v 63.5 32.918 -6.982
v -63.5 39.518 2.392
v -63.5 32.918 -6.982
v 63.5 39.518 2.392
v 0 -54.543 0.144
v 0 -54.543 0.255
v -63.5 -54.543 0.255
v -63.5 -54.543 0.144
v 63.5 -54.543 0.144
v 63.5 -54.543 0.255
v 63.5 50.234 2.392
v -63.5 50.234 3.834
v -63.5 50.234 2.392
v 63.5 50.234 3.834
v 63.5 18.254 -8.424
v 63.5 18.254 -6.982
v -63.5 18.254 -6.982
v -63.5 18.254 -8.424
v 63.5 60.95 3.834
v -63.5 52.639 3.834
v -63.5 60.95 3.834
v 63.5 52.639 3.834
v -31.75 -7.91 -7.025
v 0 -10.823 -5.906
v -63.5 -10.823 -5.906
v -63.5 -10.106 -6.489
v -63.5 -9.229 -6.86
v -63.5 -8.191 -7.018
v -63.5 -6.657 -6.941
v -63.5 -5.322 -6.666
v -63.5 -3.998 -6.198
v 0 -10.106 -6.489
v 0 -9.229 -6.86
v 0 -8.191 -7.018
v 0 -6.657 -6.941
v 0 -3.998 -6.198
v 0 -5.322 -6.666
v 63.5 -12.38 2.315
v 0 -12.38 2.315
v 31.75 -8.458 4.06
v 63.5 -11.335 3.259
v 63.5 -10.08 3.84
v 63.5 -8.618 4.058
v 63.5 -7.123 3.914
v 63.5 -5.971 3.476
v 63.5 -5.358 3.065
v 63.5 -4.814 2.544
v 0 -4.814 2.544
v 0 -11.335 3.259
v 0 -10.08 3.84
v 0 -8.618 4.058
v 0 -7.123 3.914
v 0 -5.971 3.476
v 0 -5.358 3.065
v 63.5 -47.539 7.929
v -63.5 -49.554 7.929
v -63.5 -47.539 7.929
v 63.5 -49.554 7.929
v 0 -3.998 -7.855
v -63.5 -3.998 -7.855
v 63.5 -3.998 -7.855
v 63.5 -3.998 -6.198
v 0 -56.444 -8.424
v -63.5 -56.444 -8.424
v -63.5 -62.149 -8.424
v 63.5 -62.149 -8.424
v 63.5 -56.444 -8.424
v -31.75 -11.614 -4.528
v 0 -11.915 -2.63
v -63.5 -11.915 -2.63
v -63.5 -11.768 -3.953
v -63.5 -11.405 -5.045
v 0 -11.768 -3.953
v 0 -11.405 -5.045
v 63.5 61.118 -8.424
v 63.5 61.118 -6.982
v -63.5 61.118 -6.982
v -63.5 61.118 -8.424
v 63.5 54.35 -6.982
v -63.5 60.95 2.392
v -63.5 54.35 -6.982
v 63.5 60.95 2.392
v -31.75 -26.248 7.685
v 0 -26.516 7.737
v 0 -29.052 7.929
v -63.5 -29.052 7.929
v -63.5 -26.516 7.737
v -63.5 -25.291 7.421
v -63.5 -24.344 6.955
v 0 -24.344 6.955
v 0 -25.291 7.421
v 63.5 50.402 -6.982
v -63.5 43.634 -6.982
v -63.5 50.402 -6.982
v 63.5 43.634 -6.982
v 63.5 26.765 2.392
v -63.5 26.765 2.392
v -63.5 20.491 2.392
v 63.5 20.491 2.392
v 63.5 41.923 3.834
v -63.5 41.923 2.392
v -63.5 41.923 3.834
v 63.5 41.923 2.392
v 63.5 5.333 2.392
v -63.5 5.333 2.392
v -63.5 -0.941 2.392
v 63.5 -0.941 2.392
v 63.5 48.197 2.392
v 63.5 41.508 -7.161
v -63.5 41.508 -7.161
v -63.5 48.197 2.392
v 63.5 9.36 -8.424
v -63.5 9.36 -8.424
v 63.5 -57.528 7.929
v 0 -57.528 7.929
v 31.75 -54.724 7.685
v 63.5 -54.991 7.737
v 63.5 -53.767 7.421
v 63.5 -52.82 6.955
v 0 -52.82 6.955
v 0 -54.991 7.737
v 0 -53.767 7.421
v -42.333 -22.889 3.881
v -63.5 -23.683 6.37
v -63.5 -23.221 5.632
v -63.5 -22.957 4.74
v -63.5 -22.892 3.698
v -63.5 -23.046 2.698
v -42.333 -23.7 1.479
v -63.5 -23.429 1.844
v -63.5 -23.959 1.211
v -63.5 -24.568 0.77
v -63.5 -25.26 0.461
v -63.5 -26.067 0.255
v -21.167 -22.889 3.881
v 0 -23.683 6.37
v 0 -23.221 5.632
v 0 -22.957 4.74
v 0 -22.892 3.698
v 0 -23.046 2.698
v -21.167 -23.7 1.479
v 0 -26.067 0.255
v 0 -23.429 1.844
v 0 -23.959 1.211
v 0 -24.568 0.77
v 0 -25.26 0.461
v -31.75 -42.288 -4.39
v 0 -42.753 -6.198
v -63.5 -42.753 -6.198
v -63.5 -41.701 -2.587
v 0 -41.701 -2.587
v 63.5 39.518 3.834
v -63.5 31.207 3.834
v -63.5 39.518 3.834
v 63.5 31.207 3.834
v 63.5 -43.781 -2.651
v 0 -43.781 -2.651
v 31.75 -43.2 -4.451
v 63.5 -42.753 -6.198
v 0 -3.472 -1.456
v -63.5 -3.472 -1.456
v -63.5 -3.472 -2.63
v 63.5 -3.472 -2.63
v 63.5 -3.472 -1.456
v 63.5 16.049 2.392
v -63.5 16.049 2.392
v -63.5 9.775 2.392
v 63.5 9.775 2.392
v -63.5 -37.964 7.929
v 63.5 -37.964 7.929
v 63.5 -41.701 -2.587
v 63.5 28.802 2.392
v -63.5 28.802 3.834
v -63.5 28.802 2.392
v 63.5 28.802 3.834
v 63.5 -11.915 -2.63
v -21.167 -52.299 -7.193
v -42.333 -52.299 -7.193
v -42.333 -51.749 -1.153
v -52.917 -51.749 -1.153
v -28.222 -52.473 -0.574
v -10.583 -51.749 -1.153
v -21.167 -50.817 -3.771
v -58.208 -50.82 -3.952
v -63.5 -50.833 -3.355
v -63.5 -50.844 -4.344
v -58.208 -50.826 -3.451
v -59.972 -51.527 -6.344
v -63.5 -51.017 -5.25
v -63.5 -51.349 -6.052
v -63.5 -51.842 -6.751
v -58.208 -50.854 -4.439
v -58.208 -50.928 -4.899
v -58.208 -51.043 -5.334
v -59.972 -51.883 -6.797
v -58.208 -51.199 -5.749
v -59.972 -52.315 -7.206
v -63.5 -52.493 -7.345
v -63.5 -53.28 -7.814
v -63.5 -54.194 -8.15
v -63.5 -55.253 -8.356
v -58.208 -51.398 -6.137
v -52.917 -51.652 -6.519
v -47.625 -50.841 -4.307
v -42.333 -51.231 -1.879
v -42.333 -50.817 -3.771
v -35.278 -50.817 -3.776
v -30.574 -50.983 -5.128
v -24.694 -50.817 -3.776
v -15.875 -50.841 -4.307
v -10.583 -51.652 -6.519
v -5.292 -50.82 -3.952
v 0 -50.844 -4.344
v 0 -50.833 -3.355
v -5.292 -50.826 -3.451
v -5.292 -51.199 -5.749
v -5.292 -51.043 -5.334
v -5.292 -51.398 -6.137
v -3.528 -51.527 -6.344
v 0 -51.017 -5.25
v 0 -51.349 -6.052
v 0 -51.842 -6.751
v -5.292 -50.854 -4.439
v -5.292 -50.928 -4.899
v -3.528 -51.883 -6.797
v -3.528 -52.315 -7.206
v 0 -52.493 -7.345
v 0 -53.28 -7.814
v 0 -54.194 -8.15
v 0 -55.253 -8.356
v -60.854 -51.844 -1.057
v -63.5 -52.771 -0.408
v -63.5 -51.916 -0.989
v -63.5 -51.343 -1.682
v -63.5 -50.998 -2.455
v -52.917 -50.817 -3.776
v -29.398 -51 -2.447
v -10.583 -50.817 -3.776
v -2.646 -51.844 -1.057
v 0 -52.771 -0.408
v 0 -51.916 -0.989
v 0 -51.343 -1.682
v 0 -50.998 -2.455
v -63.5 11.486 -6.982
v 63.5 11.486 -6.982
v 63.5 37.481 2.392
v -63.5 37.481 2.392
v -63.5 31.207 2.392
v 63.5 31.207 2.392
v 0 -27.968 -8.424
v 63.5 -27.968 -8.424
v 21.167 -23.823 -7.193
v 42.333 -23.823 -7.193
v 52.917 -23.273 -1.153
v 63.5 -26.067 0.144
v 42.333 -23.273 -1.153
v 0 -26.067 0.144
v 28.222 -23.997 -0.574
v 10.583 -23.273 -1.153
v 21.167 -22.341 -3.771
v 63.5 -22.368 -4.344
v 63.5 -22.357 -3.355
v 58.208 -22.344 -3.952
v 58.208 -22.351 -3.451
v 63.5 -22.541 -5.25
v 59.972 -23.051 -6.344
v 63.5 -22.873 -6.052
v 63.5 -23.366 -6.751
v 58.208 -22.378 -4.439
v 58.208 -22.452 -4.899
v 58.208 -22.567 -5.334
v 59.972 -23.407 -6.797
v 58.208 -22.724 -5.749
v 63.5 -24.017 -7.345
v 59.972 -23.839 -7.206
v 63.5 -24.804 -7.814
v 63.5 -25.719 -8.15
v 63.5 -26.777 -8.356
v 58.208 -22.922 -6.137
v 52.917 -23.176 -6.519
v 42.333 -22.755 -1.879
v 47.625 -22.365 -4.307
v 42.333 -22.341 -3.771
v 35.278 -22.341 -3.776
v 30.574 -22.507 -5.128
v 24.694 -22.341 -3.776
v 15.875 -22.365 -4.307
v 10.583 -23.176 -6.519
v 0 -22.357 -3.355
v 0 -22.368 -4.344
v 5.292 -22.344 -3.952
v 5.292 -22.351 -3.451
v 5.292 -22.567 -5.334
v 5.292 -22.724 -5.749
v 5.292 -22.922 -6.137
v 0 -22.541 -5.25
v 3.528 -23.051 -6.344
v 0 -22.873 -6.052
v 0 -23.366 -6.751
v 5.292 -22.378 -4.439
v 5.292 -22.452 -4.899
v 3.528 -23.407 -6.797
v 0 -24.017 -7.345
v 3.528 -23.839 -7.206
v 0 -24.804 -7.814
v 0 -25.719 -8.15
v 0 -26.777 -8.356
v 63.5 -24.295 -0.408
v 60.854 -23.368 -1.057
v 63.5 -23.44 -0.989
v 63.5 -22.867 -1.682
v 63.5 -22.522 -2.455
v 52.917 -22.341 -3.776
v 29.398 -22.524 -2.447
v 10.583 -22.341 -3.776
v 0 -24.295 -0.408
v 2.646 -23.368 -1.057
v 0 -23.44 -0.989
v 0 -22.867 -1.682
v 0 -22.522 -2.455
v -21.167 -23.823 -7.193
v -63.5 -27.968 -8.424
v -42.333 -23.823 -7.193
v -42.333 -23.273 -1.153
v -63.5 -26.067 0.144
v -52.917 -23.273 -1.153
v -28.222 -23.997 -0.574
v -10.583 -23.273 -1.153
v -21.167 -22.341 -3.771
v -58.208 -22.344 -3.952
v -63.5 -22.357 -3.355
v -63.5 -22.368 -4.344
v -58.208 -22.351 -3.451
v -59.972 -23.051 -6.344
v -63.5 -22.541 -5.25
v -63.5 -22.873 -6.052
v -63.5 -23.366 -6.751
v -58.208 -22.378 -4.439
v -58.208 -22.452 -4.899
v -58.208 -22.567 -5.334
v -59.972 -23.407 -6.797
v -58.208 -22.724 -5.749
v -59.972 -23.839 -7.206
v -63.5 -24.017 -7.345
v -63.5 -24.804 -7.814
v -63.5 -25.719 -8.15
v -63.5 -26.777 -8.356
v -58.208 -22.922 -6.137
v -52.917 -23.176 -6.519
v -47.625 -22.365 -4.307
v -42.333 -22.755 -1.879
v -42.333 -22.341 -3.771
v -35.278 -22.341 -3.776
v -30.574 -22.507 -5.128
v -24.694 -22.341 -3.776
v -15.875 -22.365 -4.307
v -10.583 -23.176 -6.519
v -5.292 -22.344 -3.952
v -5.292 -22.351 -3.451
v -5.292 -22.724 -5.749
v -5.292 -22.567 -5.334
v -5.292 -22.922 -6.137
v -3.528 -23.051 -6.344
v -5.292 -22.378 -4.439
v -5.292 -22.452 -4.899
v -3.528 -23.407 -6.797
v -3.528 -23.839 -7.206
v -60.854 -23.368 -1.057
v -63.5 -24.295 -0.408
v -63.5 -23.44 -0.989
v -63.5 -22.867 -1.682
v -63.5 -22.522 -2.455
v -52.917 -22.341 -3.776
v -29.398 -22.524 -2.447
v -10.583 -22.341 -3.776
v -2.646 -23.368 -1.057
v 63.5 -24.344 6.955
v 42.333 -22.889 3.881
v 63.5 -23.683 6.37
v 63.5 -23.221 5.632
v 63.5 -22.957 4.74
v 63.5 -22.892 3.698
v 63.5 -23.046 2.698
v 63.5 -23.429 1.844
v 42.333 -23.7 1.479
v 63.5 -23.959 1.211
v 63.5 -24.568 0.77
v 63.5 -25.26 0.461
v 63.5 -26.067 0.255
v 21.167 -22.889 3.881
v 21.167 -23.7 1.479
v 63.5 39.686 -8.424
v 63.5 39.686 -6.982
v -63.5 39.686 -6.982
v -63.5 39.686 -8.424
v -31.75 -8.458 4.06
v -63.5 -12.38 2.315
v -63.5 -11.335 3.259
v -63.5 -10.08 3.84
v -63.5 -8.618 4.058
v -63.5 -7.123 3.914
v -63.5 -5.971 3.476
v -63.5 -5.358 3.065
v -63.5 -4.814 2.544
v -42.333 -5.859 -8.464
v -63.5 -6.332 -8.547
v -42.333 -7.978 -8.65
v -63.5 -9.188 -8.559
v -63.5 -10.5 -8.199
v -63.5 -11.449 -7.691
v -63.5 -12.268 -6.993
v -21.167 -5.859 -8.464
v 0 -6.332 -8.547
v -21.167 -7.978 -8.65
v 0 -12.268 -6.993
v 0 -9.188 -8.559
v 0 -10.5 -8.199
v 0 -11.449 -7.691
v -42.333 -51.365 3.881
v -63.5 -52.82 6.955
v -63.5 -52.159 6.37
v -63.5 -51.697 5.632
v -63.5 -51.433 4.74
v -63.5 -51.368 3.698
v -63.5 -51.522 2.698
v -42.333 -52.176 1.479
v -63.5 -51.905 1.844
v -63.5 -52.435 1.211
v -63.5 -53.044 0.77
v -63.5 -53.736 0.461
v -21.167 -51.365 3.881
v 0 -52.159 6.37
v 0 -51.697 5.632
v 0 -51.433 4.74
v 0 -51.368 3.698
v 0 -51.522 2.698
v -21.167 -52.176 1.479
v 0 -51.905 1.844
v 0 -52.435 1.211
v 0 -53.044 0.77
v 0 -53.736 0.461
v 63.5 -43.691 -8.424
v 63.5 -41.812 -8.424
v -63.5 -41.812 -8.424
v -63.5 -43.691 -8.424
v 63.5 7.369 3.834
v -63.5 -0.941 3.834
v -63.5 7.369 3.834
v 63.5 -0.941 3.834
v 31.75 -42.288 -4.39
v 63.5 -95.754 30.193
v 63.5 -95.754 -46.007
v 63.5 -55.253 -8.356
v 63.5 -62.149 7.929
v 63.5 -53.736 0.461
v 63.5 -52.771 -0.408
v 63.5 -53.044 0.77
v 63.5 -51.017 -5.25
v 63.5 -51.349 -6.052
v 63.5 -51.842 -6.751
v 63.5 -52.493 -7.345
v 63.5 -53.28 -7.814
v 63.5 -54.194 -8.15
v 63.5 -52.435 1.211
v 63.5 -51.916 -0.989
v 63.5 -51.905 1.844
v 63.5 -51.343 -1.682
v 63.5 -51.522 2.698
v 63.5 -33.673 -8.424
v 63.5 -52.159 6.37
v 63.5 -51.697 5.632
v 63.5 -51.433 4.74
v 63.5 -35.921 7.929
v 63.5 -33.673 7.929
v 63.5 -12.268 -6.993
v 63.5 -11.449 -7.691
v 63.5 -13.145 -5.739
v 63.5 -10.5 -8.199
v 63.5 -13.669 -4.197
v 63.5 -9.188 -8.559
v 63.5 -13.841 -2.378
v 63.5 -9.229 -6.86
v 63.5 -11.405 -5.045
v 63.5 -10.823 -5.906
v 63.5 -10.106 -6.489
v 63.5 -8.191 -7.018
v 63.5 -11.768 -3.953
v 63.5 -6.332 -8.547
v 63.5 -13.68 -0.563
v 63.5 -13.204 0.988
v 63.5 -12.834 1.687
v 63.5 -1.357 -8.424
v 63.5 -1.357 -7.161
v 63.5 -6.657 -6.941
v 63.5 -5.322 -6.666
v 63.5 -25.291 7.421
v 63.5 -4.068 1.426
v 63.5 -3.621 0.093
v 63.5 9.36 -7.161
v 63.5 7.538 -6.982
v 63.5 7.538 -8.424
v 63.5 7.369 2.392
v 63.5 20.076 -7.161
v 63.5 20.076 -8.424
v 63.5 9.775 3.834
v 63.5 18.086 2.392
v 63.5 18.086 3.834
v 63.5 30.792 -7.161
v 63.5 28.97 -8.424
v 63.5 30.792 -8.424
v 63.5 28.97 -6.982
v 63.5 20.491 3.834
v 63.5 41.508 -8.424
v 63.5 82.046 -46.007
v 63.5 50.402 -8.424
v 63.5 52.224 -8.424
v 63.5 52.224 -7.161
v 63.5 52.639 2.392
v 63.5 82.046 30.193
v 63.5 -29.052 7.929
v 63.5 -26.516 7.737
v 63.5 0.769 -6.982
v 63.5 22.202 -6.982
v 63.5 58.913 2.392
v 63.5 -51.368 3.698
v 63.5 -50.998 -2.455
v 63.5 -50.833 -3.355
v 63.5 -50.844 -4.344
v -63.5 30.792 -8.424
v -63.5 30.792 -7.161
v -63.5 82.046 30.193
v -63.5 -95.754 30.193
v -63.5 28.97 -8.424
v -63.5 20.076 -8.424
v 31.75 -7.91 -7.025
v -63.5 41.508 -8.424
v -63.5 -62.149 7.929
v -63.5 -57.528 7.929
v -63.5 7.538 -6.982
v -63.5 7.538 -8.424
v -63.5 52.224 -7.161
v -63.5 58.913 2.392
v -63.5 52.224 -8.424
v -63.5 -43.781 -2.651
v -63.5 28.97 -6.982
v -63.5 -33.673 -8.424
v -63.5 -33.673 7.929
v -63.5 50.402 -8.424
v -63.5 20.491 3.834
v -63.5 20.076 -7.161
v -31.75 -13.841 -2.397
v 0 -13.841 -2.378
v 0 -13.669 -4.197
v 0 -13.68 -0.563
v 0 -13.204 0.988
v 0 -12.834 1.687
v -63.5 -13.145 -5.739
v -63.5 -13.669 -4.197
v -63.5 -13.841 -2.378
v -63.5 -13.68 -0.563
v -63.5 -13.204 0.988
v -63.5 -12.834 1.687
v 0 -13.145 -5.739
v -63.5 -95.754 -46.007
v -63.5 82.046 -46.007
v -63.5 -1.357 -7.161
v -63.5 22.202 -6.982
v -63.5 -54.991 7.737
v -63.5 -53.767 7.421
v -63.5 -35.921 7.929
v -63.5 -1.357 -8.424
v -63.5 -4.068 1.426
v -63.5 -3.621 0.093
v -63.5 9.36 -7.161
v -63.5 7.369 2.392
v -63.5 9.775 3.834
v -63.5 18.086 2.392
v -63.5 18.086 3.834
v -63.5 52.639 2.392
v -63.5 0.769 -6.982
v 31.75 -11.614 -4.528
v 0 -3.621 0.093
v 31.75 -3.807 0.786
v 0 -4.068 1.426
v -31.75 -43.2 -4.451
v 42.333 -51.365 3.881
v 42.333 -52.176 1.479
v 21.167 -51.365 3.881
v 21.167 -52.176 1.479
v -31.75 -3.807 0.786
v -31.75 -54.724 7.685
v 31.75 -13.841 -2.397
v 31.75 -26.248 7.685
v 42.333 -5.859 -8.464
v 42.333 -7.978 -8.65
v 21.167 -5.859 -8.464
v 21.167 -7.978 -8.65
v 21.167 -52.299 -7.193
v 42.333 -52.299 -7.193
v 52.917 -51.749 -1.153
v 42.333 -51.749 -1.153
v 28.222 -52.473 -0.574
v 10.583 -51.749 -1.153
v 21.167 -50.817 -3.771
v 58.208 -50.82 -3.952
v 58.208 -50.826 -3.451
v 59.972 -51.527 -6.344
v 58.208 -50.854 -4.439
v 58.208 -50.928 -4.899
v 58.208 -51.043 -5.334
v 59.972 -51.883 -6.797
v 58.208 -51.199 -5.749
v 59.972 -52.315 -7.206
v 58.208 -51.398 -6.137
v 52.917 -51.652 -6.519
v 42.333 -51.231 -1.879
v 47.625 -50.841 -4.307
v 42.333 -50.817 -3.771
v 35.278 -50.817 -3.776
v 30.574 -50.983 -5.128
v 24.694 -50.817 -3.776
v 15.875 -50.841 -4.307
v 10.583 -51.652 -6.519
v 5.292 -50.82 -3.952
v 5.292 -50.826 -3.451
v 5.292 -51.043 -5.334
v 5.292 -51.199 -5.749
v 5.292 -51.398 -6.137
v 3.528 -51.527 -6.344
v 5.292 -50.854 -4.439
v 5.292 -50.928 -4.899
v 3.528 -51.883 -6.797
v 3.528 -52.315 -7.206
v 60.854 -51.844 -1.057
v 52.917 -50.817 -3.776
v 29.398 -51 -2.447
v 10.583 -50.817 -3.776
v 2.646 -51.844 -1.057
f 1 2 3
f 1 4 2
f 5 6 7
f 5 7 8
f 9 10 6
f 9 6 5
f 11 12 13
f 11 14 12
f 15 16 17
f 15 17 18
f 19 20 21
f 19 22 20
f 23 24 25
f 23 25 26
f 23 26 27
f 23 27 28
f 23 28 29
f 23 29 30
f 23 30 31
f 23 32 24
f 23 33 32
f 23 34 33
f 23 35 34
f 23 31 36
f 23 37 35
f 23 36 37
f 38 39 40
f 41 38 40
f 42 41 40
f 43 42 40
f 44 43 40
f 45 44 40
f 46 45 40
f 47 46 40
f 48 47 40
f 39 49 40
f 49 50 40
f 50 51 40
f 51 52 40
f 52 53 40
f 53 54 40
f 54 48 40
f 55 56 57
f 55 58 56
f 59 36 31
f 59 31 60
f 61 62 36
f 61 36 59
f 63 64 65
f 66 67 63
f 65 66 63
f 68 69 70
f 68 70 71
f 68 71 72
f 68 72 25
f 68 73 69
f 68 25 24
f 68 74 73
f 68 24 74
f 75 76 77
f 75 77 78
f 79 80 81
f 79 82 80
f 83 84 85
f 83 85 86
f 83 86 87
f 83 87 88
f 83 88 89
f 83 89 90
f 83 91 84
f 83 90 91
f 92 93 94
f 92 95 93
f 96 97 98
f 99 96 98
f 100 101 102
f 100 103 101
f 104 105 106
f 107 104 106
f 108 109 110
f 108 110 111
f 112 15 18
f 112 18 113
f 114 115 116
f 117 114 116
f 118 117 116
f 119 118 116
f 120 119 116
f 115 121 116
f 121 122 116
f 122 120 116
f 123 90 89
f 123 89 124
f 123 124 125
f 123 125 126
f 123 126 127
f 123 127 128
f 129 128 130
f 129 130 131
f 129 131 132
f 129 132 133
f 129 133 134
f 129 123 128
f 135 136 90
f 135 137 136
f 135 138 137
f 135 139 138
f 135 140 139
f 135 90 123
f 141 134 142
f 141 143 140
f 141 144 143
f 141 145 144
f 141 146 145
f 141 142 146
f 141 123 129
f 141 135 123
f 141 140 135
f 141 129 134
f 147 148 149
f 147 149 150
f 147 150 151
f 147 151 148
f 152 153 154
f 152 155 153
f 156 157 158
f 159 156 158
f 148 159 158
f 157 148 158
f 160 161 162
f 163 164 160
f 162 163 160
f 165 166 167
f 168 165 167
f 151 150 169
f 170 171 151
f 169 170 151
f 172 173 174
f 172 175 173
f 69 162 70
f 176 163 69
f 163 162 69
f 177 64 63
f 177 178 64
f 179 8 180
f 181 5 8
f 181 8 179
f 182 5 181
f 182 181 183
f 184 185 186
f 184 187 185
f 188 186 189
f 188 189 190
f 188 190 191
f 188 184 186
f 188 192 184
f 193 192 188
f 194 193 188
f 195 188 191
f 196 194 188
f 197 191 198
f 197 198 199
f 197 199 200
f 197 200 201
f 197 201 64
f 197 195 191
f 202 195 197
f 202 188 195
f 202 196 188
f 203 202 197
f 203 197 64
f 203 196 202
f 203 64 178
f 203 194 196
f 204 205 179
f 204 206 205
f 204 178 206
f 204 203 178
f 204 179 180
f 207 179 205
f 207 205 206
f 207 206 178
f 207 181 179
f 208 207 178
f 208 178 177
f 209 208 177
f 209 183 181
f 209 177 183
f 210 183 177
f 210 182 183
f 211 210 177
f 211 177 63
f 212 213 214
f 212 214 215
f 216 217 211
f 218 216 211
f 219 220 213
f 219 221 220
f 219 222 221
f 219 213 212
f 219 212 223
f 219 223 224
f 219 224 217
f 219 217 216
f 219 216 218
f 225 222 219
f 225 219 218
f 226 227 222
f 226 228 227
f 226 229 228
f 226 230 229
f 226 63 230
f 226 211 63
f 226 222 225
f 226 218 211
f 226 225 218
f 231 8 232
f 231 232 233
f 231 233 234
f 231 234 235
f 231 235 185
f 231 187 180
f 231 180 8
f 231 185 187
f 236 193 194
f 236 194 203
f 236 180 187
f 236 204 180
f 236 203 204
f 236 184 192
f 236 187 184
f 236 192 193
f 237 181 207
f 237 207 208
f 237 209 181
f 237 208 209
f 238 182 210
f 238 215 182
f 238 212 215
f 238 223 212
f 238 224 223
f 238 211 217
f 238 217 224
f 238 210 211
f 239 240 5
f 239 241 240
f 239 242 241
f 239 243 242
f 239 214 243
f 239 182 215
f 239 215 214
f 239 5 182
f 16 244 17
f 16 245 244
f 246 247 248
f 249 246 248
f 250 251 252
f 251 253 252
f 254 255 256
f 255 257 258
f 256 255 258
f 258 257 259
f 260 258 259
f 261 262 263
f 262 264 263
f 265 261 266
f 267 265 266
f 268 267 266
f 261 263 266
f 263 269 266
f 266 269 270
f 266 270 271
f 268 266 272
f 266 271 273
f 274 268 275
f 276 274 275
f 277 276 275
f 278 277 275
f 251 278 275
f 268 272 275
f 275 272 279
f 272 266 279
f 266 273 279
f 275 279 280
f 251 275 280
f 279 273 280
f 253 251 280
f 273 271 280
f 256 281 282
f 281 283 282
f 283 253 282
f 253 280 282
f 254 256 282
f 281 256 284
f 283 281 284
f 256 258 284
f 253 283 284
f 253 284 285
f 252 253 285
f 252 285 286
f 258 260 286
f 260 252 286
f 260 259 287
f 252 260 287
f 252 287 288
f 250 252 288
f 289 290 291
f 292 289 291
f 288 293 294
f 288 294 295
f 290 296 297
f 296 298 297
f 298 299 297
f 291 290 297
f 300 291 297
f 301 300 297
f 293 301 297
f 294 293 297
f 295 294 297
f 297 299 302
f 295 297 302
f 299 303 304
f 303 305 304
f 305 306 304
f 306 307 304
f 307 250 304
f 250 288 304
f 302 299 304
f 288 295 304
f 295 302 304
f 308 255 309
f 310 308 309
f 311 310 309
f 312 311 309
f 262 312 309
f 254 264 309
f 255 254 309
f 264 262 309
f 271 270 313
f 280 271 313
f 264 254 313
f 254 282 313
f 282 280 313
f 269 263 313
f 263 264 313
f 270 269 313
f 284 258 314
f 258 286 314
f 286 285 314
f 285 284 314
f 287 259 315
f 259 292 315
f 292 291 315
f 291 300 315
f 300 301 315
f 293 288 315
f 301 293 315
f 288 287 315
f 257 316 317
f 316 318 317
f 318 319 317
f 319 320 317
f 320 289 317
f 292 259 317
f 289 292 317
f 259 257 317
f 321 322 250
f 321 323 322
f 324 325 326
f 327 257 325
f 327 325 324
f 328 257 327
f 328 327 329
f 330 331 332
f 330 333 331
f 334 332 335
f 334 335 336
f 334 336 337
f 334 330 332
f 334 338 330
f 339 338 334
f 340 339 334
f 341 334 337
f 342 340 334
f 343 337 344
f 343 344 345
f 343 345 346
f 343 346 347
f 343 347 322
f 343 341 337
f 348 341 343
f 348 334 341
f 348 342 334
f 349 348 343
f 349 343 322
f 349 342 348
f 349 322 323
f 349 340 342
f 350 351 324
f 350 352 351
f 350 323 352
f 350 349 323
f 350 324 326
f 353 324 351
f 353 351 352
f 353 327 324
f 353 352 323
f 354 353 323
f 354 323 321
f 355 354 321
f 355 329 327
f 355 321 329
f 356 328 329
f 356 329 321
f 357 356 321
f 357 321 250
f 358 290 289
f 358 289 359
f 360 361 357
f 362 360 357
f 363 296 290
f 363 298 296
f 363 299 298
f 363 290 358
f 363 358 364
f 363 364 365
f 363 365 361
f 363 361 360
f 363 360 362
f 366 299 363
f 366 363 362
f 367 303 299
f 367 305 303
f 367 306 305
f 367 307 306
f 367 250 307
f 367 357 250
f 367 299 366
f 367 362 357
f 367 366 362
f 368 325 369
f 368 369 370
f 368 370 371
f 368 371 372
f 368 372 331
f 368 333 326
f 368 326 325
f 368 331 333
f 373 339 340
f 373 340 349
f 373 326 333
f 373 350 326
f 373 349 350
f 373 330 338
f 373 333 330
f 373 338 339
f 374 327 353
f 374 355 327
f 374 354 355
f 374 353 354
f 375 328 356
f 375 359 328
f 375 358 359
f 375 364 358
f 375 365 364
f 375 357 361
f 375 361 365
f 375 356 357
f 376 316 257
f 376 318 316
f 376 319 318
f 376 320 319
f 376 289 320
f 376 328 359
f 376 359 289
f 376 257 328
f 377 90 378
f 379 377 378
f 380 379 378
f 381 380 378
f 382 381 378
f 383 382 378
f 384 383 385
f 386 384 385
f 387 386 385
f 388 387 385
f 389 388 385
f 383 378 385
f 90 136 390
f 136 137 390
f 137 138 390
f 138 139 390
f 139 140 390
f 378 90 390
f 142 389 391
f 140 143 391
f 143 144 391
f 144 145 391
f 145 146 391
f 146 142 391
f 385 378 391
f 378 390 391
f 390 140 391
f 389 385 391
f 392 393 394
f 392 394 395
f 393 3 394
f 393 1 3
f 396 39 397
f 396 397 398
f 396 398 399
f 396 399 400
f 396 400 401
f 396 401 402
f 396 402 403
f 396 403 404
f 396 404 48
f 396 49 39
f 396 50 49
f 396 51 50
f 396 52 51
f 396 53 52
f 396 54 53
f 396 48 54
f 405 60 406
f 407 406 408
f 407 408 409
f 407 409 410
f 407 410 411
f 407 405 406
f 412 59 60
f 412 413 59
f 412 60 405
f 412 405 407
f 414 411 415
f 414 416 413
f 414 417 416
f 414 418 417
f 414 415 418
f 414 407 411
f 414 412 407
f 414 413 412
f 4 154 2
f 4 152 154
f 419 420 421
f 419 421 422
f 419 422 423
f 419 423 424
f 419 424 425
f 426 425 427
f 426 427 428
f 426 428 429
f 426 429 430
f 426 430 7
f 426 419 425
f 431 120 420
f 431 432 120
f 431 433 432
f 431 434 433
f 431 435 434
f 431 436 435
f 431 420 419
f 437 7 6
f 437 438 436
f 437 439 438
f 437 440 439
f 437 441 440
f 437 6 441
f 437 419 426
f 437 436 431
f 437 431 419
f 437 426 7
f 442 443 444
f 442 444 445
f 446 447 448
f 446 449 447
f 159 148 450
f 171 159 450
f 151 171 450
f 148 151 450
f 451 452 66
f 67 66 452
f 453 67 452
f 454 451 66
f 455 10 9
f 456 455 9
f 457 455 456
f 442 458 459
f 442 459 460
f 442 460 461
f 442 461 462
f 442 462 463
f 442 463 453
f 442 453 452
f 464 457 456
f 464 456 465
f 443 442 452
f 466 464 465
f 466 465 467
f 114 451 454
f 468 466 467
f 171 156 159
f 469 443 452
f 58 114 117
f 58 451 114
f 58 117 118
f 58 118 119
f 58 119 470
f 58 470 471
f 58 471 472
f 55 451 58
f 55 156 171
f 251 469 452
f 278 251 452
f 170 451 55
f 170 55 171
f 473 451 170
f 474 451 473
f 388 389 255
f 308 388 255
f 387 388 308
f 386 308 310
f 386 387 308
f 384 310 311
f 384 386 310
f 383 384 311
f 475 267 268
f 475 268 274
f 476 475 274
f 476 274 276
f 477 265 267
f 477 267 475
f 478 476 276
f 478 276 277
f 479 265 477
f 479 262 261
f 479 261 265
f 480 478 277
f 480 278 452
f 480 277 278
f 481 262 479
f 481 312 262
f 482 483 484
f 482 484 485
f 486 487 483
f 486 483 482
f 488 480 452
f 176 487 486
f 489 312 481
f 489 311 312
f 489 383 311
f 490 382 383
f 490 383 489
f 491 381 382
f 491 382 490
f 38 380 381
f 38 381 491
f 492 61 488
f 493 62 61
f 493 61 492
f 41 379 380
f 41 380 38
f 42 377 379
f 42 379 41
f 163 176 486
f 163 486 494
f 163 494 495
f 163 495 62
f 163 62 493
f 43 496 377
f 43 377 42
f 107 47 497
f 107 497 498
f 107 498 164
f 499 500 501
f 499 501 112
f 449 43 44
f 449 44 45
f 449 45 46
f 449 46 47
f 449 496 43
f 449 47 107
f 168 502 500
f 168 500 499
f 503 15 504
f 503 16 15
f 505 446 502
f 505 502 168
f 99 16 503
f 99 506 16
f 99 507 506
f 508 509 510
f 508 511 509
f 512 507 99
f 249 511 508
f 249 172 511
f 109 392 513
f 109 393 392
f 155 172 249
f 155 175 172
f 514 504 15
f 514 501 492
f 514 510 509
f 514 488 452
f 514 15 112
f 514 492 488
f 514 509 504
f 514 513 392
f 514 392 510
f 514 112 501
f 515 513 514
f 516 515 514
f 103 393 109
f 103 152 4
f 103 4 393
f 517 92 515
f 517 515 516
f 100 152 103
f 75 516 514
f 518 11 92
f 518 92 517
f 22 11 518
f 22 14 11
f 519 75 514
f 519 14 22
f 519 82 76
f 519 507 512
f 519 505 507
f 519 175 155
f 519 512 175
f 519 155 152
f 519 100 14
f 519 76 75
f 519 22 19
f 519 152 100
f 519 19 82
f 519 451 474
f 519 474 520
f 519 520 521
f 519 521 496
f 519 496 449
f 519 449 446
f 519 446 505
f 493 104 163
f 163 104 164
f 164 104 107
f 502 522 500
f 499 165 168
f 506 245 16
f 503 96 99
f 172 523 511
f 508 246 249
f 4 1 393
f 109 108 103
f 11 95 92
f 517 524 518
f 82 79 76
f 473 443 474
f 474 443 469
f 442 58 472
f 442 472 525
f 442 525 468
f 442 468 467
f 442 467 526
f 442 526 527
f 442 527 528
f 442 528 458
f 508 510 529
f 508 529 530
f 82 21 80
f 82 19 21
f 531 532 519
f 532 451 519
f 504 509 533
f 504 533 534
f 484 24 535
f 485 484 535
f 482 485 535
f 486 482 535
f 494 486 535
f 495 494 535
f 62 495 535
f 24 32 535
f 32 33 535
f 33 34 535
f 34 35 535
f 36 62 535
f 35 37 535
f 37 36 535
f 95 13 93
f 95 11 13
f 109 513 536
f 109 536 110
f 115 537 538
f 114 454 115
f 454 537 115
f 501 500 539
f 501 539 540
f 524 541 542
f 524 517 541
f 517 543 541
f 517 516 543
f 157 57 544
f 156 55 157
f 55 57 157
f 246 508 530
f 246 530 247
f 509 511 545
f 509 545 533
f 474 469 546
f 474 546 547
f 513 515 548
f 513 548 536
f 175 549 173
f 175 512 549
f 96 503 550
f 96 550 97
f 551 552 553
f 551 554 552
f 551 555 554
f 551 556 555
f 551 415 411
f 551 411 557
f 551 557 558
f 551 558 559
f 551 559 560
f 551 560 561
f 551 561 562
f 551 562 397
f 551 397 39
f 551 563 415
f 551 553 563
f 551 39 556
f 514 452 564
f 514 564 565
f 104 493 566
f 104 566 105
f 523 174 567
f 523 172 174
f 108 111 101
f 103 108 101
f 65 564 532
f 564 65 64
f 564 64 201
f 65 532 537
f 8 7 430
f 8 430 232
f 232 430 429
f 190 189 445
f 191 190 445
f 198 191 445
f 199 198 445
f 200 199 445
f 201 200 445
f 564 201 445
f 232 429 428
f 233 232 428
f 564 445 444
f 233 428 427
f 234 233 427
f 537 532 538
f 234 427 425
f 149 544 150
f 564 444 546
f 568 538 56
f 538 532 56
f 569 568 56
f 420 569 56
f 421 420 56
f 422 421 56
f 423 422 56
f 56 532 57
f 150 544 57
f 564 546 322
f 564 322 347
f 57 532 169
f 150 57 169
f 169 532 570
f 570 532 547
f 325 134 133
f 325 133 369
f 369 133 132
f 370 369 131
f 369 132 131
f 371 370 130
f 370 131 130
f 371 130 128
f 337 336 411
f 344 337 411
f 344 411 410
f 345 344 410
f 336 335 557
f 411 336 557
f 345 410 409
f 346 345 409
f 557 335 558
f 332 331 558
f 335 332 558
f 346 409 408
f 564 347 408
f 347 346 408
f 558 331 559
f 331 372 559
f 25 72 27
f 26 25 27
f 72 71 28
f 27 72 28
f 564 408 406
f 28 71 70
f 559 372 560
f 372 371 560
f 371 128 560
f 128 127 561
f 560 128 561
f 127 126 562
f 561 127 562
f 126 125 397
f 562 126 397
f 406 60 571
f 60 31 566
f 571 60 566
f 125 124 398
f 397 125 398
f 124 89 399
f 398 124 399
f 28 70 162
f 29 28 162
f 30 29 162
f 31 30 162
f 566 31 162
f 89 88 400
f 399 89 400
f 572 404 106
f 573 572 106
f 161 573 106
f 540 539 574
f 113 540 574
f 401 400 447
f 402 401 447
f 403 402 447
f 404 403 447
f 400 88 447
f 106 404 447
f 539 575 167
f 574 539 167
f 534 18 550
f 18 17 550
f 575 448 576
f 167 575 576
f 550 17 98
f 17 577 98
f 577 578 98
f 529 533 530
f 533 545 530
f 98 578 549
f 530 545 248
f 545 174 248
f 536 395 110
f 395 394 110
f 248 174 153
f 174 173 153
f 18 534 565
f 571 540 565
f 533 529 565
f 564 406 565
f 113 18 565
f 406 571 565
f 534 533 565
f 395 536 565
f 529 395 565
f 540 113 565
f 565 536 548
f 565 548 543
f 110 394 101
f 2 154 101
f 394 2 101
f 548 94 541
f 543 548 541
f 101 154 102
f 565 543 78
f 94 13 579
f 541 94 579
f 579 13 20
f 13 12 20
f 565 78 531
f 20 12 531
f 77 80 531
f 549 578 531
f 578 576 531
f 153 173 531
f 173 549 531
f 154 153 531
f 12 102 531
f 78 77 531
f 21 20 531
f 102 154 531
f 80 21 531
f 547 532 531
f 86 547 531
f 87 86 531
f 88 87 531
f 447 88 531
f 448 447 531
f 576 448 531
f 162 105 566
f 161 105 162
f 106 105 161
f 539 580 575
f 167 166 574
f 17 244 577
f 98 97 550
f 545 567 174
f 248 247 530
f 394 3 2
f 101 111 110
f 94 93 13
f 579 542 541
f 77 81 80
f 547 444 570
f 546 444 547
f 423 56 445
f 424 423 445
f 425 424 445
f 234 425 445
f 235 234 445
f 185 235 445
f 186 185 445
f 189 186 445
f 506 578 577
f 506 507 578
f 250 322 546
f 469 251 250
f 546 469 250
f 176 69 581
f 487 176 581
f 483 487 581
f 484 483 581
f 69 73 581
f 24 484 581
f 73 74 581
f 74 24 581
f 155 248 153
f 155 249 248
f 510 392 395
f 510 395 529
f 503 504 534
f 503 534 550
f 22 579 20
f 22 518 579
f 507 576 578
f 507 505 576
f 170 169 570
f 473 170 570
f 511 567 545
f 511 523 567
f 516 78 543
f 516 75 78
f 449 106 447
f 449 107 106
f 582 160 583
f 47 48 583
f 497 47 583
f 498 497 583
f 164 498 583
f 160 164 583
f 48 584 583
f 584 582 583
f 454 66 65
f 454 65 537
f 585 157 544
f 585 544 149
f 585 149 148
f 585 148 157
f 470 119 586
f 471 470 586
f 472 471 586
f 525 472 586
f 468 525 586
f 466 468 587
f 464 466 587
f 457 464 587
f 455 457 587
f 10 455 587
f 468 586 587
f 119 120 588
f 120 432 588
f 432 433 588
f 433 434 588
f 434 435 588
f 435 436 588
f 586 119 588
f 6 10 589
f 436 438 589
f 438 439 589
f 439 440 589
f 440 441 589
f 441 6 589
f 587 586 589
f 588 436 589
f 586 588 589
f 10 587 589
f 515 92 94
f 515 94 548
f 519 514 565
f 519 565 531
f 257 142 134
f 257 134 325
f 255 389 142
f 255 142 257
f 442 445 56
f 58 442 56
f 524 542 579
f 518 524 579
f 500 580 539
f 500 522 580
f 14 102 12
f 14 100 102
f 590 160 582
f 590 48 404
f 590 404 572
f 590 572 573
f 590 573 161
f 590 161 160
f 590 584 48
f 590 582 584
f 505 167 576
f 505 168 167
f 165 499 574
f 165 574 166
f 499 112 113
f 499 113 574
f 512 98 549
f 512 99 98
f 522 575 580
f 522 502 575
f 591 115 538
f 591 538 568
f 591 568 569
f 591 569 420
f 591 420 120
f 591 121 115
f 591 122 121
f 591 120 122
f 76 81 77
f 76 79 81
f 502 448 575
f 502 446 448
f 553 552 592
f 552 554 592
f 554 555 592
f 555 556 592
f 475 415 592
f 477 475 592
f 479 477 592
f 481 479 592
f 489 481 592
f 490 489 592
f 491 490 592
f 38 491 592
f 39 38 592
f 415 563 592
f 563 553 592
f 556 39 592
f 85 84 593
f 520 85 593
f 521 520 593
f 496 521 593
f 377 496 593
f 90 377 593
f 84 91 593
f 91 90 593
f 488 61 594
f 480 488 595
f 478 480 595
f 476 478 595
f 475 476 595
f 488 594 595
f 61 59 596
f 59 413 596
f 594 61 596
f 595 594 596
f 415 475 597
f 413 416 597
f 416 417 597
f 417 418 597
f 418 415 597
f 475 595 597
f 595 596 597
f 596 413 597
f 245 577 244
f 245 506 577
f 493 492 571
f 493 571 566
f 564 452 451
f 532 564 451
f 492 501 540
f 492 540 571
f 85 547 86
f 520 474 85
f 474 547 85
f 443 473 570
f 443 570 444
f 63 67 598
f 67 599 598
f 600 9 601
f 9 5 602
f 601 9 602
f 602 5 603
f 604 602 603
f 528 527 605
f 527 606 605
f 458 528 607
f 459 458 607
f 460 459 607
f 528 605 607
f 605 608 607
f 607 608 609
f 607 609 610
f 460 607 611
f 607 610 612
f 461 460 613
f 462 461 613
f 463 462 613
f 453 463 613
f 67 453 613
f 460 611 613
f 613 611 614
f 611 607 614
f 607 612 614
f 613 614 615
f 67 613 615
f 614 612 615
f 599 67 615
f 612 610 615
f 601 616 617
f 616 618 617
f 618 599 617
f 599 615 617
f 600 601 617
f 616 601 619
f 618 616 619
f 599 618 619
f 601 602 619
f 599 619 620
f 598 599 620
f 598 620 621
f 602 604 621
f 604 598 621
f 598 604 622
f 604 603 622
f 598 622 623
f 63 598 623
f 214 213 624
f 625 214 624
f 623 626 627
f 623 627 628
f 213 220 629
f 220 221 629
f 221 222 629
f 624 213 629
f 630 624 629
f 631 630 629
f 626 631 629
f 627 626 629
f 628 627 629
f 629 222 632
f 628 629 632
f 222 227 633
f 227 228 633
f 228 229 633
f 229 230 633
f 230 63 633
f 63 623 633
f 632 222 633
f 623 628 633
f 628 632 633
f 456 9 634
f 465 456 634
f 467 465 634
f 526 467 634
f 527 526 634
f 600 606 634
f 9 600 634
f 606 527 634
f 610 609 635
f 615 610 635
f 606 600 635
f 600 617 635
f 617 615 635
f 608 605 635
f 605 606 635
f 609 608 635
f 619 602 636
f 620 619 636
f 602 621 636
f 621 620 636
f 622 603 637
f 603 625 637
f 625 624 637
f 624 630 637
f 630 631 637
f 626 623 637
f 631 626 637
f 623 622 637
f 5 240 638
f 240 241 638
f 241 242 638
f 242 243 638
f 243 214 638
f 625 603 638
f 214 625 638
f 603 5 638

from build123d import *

# Parameters (mm, degrees)
F0_W     = 177.8
F0_H     = 76.2
F1_DEPTH = 63.5


with BuildPart() as f1:
    # F0 (on Right) → F1 (new body, symmetric)
    with BuildSketch(Plane.YZ):
        with Locations((-6.8537443876, -7.9069595627)):
            Rectangle(F0_W, F0_H)
        with BuildLine():
            Line((-62.1489095043, -8.4243910387), (-62.1489095043, 7.9288767233))
            Line((-62.1489095043, 7.9288767233), (-57.528189723, 7.9288767233))
            add(Edge.make_bspline(
                [(-57.528189723, 7.9288767233), (-54.2747162286, 7.9288767233), (-52.819780062, 6.9553401001)],
                knots=[0, 0, 0, 1, 1, 1], degree=2))
            add(Edge.make_bspline(
                [(-52.819780062, 6.9553401001), (-51.3648438954, 5.981803477), (-51.3648438954, 3.8808255439)],
                knots=[0, 0, 0, 1, 1, 1], degree=2))
            add(Edge.make_bspline(
                [(-51.3648438954, 3.8808255439), (-51.3648438954, 2.4240997879), (-52.1755278849, 1.4791965948)],
                knots=[0, 0, 0, 1, 1, 1], degree=2))
            add(Edge.make_bspline(
                [(-52.1755278849, 1.4791965948), (-52.9862118744, 0.5342934017), (-54.5431546357, 0.2551174583)],
                knots=[0, 0, 0, 1, 1, 1], degree=2))
            Line((-54.5431546357, 0.2551174583), (-54.5431546357, 0.1441629167))
            add(Edge.make_bspline(
                [(-54.5431546357, 0.1441629167), (-50.8172295449, -0.4929309029), (-50.8172295449, -3.7714586486)],
                knots=[0, 0, 0, 1, 1, 1], degree=2))
            add(Edge.make_bspline(
                [(-50.8172295449, -3.7714586486), (-50.8172295449, -5.9619160507), (-52.2990095522, -7.1931535447)],
                knots=[0, 0, 0, 1, 1, 1], degree=2))
            add(Edge.make_bspline(
                [(-52.2990095522, -7.1931535447), (-53.7807895595, -8.4243910387), (-56.4436985582, -8.4243910387)],
                knots=[0, 0, 0, 1, 1, 1], degree=2))
            Line((-56.4436985582, -8.4243910387), (-62.1489095043, -8.4243910387))
        make_face(mode=Mode.SUBTRACT)
        with BuildLine():
            Line((-41.7010612389, -2.5867504784), (-37.9643986117, 7.9288767233))
            Line((-37.9643986117, 7.9288767233), (-35.9206875388, 7.9288767233))
            Line((-35.9206875388, 7.9288767233), (-41.8120157805, -8.4243910387))
            Line((-41.8120157805, -8.4243910387), (-43.6910846304, -8.4243910387))
            Line((-43.6910846304, -8.4243910387), (-49.553779442, 7.9288767233))
            Line((-49.553779442, 7.9288767233), (-47.5387017992, 7.9288767233))
            Line((-47.5387017992, 7.9288767233), (-43.7805640994, -2.6511756962))
            add(Edge.make_bspline(
                [(-43.7805640994, -2.6511756962), (-43.1327327436, -4.4765568646), (-42.7533397948, -6.198141849)],
                knots=[0, 0, 0, 1, 1, 1], degree=2))
            add(Edge.make_bspline(
                [(-42.7533397948, -6.198141849), (-42.3488925948, -4.3870773956), (-41.7010612389, -2.5867504784)],
                knots=[0, 0, 0, 1, 1, 1], degree=2))
        make_face(mode=Mode.SUBTRACT)
        with BuildLine():
            Line((-33.6729632765, -8.4243910387), (-33.6729632765, 7.9288767233))
            Line((-33.6729632765, 7.9288767233), (-29.0522434952, 7.9288767233))
            add(Edge.make_bspline(
                [(-29.0522434952, 7.9288767233), (-25.7987700008, 7.9288767233), (-24.3438338342, 6.9553401001)],
                knots=[0, 0, 0, 1, 1, 1], degree=2))
            add(Edge.make_bspline(
                [(-24.3438338342, 6.9553401001), (-22.8888976676, 5.981803477), (-22.8888976676, 3.8808255439)],
                knots=[0, 0, 0, 1, 1, 1], degree=2))
            add(Edge.make_bspline(
                [(-22.8888976676, 3.8808255439), (-22.8888976676, 2.4240997879), (-23.6995816571, 1.4791965948)],
                knots=[0, 0, 0, 1, 1, 1], degree=2))
            add(Edge.make_bspline(
                [(-23.6995816571, 1.4791965948), (-24.5102656466, 0.5342934017), (-26.067208408, 0.2551174583)],
                knots=[0, 0, 0, 1, 1, 1], degree=2))
            Line((-26.067208408, 0.2551174583), (-26.067208408, 0.1441629167))
            add(Edge.make_bspline(
                [(-26.067208408, 0.1441629167), (-22.3412833171, -0.4929309029), (-22.3412833171, -3.7714586486)],
                knots=[0, 0, 0, 1, 1, 1], degree=2))
            add(Edge.make_bspline(
                [(-22.3412833171, -3.7714586486), (-22.3412833171, -5.9619160507), (-23.8230633244, -7.1931535447)],
                knots=[0, 0, 0, 1, 1, 1], degree=2))
            add(Edge.make_bspline(
                [(-23.8230633244, -7.1931535447), (-25.3048433317, -8.4243910387), (-27.9677523304, -8.4243910387)],
                knots=[0, 0, 0, 1, 1, 1], degree=2))
            Line((-27.9677523304, -8.4243910387), (-33.6729632765, -8.4243910387))
        make_face(mode=Mode.SUBTRACT)
        with BuildLine():
            add(Edge.make_bspline(
                [(-5.8591651196, -8.4637620051), (-6.7360639162, -8.6498793007), (-7.9780389465, -8.6498793007)],
                knots=[0, 0, 0, 1, 1, 1], degree=2))
            add(Edge.make_bspline(
                [(-7.9780389465, -8.6498793007), (-10.6946356266, -8.6498793007), (-12.2676846924, -6.9927195341)],
                knots=[0, 0, 0, 1, 1, 1], degree=2))
            add(Edge.make_bspline(
                [(-12.2676846924, -6.9927195341), (-13.8407337581, -5.3355597674), (-13.8407337581, -2.3970540041)],
                knots=[0, 0, 0, 1, 1, 1], degree=2))
            add(Edge.make_bspline(
                [(-13.8407337581, -2.3970540041), (-13.8407337581, 0.5700851893), (-12.3804288234, 2.3149348356)],
                knots=[0, 0, 0, 1, 1, 1], degree=2))
            add(Edge.make_bspline(
                [(-12.3804288234, 2.3149348356), (-10.9201238886, 4.059784482), (-8.4576489006, 4.059784482)],
                knots=[0, 0, 0, 1, 1, 1], degree=2))
            add(Edge.make_bspline(
                [(-8.4576489006, 4.059784482), (-6.1562369569, 4.059784482), (-4.8140449212, 2.5440022764)],
                knots=[0, 0, 0, 1, 1, 1], degree=2))
            add(Edge.make_bspline(
                [(-4.8140449212, 2.5440022764), (-3.4718528856, 1.0282200708), (-3.4718528856, -1.4557299898)],
                knots=[0, 0, 0, 1, 1, 1], degree=2))
            Line((-3.4718528856, -1.4557299898), (-3.4718528856, -2.6297006236))
            Line((-3.4718528856, -2.6297006236), (-11.9151355844, -2.6297006236))
            add(Edge.make_bspline(
                [(-11.9151355844, -2.6297006236), (-11.8578687242, -4.7879454169), (-10.8234860621, -5.9064387799)],
                knots=[0, 0, 0, 1, 1, 1], degree=2))
            add(Edge.make_bspline(
                [(-10.8234860621, -5.9064387799), (-9.7891033999, -7.0249321429), (-7.9100345501, -7.0249321429)],
                knots=[0, 0, 0, 1, 1, 1], degree=2))
            add(Edge.make_bspline(
                [(-7.9100345501, -7.0249321429), (-5.9307486949, -7.0249321429), (-3.9979921636, -6.198141849)],
                knots=[0, 0, 0, 1, 1, 1], degree=2))
            Line((-3.9979921636, -6.198141849), (-3.9979921636, -7.8553016156))
            add(Edge.make_bspline(
                [(-3.9979921636, -7.8553016156), (-4.982266323, -8.2776447095), (-5.8591651196, -8.4637620051)],
                knots=[0, 0, 0, 1, 1, 1], degree=2))
        make_face(mode=Mode.SUBTRACT)
        Polygon((7.5377009853, -6.9819819978), (7.5377009853, -8.4243910387), (-1.3565582375, -8.4243910387), (-1.3565582375, -7.1609409358), (5.3329268681, 2.391887179), (-0.9413735011, 2.391887179), (-0.9413735011, 3.83429622), (7.3694795835, 3.83429622), (7.3694795835, 2.391887179), (0.769473947, -6.9819819978), align=None, mode=Mode.SUBTRACT)
        Polygon((18.2537621977, -6.9819819978), (18.2537621977, -8.4243910387), (9.3595029749, -8.4243910387), (9.3595029749, -7.1609409358), (16.0489880805, 2.391887179), (9.7746877113, 2.391887179), (9.7746877113, 3.83429622), (18.0855407959, 3.83429622), (18.0855407959, 2.391887179), (11.4855351594, -6.9819819978), align=None, mode=Mode.SUBTRACT)
        Polygon((28.9698234101, -6.9819819978), (28.9698234101, -8.4243910387), (20.0755641874, -8.4243910387), (20.0755641874, -7.1609409358), (26.7650492929, 2.391887179), (20.4907489237, 2.391887179), (20.4907489237, 3.83429622), (28.8016020083, 3.83429622), (28.8016020083, 2.391887179), (22.2015963718, -6.9819819978), align=None, mode=Mode.SUBTRACT)
        Polygon((39.6858846225, -6.9819819978), (39.6858846225, -8.4243910387), (30.7916253998, -8.4243910387), (30.7916253998, -7.1609409358), (37.4811105053, 2.391887179), (31.2068101361, 2.391887179), (31.2068101361, 3.83429622), (39.5176632207, 3.83429622), (39.5176632207, 2.391887179), (32.9176575842, -6.9819819978), align=None, mode=Mode.SUBTRACT)
        Polygon((50.4019458349, -6.9819819978), (50.4019458349, -8.4243910387), (41.5076866122, -8.4243910387), (41.5076866122, -7.1609409358), (48.1971717177, 2.391887179), (41.9228713485, 2.391887179), (41.9228713485, 3.83429622), (50.2337244331, 3.83429622), (50.2337244331, 2.391887179), (43.6337187966, -6.9819819978), align=None, mode=Mode.SUBTRACT)
        Polygon((61.1180070473, -6.9819819978), (61.1180070473, -8.4243910387), (52.2237478246, -8.4243910387), (52.2237478246, -7.1609409358), (58.9132329301, 2.391887179), (52.6389325609, 2.391887179), (52.6389325609, 3.83429622), (60.9497856455, 3.83429622), (60.9497856455, 2.391887179), (54.349780009, -6.9819819978), align=None, mode=Mode.SUBTRACT)
    extrude(amount=F1_DEPTH, both=True)


solid = f1.part
